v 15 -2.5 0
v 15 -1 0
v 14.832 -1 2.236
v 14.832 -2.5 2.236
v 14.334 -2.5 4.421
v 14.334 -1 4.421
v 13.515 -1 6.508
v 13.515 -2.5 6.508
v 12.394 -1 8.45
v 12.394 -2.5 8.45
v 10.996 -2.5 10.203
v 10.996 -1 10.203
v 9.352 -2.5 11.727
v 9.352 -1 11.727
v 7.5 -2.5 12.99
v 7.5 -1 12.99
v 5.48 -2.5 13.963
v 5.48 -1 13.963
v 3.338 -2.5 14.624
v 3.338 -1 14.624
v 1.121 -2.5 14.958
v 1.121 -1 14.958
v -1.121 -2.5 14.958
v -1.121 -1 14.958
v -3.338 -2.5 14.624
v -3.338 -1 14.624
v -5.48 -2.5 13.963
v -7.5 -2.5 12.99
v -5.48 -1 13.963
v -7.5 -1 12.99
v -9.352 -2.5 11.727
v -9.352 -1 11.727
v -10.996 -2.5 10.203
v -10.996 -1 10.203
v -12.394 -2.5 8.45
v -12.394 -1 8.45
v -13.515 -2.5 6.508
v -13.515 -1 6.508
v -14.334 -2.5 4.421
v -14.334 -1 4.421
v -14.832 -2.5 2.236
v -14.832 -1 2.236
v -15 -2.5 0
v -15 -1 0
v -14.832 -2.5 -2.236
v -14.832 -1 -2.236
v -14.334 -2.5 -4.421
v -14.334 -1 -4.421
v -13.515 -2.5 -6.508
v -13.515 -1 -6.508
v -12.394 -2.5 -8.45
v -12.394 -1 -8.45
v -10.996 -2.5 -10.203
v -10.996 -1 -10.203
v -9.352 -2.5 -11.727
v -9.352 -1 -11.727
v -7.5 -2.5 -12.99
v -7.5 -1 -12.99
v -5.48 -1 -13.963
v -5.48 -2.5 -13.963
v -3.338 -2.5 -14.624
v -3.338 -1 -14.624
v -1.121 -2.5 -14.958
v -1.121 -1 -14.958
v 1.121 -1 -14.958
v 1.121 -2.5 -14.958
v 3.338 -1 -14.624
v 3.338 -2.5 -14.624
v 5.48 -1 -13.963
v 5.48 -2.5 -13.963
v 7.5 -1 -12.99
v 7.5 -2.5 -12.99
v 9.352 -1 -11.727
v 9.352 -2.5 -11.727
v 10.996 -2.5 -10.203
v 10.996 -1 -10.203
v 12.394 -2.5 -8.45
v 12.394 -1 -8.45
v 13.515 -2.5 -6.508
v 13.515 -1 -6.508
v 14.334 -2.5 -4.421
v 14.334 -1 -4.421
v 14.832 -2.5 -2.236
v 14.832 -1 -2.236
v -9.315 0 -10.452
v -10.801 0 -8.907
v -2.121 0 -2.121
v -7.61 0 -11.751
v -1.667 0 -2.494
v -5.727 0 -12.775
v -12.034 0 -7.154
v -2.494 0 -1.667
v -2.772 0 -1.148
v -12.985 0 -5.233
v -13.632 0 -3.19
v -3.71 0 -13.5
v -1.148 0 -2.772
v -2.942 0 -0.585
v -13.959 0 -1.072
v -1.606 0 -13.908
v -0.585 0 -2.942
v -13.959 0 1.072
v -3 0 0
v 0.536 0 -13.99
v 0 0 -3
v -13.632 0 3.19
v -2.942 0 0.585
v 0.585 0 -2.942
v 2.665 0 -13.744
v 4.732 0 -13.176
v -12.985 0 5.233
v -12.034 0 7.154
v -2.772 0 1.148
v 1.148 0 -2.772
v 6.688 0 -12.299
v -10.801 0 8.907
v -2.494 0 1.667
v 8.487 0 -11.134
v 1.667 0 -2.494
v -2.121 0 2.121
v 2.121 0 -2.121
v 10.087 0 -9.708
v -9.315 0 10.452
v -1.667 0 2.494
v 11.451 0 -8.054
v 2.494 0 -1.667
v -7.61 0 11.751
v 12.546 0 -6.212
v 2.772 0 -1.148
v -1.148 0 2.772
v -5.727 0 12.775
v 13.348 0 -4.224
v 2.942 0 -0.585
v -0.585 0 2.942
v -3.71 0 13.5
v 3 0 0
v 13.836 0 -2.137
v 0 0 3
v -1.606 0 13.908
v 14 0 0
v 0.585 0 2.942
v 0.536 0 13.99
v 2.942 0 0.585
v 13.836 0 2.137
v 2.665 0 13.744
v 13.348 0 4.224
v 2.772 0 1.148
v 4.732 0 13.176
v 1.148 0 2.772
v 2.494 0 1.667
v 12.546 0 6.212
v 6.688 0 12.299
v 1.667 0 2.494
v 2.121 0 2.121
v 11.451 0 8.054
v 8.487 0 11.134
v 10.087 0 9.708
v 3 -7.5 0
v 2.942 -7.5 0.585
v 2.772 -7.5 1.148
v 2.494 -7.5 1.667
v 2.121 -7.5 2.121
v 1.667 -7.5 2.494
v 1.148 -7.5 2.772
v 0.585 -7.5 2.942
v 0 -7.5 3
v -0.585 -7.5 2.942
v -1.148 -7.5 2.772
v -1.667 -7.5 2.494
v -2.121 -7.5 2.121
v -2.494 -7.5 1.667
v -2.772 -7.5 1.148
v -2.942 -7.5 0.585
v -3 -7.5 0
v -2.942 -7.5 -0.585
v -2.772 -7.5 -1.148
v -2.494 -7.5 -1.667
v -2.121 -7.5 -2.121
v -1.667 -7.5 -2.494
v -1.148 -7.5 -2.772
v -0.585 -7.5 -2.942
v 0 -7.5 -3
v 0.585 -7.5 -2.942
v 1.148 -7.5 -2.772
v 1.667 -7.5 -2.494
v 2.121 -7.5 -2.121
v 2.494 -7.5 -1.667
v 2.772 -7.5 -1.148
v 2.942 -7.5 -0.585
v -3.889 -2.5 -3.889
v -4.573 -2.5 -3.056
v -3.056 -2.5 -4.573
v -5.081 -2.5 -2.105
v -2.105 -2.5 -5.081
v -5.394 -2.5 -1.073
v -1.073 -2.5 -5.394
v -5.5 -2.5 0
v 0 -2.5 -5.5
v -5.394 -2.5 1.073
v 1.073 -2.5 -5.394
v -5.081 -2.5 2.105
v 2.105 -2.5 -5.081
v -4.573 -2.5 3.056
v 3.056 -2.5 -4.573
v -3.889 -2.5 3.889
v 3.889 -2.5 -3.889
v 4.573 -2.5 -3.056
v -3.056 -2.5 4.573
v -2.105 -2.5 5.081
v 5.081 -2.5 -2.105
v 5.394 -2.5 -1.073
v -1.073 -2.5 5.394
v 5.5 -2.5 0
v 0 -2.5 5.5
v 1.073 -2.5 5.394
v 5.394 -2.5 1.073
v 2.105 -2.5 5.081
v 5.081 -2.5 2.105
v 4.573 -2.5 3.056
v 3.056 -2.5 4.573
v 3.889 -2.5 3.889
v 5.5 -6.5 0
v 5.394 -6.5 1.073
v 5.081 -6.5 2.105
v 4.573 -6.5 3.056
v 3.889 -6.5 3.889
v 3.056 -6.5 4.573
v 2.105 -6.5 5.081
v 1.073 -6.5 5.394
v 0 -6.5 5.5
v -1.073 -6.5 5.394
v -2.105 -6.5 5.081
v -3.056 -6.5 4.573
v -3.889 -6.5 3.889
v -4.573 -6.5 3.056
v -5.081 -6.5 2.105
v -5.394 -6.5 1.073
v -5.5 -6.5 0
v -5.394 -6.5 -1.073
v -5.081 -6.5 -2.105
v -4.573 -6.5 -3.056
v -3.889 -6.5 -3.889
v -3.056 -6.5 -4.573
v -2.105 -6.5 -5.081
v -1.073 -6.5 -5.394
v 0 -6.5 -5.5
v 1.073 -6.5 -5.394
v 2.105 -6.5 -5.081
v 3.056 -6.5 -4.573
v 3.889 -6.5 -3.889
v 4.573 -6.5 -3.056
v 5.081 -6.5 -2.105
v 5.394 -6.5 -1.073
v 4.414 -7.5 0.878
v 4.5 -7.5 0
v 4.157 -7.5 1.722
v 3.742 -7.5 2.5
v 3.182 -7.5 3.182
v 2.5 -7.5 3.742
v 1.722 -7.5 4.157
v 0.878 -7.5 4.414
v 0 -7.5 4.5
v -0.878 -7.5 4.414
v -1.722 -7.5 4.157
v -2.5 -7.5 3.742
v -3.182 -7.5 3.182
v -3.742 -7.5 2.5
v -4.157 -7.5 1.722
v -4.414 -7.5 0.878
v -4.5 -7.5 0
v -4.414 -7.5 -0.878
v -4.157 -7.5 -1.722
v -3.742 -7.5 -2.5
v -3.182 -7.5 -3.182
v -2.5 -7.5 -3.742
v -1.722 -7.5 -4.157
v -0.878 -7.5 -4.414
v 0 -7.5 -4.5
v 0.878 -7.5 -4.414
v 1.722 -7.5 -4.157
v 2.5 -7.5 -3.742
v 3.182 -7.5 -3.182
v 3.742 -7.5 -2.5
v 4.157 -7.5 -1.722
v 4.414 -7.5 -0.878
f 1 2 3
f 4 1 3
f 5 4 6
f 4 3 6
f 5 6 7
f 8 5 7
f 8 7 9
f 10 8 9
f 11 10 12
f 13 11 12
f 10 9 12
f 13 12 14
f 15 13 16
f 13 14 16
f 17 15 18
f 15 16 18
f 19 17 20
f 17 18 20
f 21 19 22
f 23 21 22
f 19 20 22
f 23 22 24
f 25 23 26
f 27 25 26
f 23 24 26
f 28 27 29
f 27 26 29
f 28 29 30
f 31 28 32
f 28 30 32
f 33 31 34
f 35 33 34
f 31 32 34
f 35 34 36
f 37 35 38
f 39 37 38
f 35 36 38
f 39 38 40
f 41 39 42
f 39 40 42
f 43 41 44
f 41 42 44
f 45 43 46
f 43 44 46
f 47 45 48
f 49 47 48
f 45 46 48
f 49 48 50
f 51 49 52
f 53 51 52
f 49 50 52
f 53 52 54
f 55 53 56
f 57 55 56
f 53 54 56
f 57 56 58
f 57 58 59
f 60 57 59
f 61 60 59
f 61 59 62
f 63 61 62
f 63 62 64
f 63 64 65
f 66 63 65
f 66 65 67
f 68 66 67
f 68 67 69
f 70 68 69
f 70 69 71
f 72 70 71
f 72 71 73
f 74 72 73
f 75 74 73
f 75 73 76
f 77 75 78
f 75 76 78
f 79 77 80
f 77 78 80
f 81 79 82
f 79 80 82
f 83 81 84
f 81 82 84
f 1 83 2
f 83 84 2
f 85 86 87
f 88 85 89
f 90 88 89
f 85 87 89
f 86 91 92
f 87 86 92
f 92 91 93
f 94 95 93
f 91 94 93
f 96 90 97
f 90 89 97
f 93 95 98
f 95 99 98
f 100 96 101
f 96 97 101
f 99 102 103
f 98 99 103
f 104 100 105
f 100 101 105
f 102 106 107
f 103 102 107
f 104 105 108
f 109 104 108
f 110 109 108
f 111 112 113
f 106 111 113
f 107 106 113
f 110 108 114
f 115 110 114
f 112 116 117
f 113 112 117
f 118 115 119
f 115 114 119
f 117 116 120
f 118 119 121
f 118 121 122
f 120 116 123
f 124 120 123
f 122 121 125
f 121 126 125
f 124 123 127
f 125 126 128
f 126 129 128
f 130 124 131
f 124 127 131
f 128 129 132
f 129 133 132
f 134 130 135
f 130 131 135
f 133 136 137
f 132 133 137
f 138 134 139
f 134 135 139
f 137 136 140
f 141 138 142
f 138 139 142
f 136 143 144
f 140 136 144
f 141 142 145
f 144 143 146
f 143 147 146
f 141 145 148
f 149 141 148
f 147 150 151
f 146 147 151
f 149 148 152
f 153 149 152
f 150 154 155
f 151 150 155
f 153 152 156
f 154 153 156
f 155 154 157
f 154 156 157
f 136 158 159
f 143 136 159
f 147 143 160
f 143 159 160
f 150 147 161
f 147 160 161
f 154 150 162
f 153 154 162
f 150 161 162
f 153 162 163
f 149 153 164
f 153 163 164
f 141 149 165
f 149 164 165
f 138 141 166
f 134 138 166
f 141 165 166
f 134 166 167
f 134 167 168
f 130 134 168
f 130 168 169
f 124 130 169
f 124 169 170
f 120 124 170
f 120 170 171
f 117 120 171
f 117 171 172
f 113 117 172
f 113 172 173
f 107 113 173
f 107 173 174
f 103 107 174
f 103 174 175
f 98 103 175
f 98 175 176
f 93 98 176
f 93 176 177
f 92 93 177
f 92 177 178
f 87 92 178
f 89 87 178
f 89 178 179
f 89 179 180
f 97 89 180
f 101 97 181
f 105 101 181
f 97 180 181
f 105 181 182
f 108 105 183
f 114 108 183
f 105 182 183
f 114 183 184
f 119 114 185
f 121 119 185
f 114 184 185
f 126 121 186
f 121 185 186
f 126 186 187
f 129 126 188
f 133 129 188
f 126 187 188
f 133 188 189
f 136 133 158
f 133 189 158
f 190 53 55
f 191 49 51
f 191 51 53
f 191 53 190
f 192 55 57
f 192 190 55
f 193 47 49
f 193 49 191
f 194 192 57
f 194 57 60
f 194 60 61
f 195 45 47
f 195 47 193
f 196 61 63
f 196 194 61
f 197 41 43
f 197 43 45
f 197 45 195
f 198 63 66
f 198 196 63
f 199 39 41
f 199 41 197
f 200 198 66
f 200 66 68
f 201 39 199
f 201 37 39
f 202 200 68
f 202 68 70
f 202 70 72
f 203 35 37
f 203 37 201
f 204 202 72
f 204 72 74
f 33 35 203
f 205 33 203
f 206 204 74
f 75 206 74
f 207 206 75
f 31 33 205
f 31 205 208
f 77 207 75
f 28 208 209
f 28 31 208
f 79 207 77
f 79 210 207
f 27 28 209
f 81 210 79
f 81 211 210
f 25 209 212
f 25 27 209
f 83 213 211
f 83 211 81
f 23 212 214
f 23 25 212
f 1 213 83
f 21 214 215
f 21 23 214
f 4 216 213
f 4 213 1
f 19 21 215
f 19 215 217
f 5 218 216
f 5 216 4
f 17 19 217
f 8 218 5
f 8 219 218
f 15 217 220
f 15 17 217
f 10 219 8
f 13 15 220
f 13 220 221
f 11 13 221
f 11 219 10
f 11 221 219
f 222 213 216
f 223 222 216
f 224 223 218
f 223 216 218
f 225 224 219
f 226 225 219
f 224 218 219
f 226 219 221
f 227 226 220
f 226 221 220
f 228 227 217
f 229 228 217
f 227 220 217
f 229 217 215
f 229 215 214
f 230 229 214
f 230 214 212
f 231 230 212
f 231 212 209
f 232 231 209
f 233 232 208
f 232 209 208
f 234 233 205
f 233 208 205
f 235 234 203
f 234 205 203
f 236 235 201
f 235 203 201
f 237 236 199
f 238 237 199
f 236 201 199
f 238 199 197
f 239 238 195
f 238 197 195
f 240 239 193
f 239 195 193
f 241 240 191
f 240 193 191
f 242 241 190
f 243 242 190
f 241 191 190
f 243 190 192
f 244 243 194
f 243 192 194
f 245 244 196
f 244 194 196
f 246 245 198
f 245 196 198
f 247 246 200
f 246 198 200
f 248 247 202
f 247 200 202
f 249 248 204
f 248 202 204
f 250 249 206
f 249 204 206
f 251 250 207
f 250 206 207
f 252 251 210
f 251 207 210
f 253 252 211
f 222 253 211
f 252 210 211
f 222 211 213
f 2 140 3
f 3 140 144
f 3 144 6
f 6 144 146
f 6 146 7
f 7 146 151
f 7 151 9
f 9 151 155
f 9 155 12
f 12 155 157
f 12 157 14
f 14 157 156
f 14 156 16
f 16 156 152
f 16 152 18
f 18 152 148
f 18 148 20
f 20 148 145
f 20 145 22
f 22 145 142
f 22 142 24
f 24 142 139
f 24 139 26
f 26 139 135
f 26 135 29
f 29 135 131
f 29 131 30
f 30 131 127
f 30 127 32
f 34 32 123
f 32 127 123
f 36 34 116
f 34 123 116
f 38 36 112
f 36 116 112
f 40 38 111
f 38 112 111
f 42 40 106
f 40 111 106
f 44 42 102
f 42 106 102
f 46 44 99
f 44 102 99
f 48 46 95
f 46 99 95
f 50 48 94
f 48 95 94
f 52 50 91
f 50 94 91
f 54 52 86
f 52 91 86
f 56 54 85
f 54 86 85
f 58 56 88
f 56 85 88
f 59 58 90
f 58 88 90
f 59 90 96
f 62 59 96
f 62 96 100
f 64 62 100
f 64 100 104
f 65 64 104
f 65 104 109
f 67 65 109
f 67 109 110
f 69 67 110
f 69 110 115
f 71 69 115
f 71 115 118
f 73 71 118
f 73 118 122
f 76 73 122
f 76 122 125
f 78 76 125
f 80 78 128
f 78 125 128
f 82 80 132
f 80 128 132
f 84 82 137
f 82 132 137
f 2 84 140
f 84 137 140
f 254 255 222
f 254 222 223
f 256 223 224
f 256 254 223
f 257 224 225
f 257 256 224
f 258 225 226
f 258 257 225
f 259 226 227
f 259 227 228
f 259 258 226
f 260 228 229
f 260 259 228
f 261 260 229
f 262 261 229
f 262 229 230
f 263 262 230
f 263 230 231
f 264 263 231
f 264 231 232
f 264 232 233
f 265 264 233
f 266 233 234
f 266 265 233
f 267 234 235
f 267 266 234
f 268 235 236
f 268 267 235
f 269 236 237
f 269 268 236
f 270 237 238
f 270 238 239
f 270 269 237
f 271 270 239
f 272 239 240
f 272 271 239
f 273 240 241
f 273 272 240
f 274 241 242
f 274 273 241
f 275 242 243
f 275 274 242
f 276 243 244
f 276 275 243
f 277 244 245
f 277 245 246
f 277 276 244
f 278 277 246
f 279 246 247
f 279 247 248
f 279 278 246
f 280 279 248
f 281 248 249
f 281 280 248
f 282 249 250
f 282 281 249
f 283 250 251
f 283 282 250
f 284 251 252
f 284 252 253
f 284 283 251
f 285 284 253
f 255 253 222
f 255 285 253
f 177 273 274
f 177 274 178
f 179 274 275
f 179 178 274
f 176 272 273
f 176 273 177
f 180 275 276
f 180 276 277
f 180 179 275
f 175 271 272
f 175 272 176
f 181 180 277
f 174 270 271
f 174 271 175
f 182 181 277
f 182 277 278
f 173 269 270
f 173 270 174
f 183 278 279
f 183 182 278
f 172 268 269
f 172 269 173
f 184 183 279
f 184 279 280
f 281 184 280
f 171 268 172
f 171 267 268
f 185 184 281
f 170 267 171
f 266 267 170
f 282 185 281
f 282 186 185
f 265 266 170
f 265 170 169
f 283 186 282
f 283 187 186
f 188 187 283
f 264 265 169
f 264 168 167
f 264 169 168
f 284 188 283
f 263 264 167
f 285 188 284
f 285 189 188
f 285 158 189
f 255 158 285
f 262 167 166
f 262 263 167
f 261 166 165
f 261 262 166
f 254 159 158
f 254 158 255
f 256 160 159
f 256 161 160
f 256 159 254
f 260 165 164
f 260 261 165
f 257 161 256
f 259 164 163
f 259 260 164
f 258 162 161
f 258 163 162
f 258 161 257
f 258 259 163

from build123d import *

# Parameters (mm, degrees)
F0_R     = 15
F1_DEPTH = 2.5
F2_R     = 5.5
F3_DEPTH = 5
F4_R     = 3
F5_DEPTH = 25
F6_SIZE  = 1


with BuildPart() as f1:
    # F0 (on Front) → F1 (new body)
    with BuildSketch(Plane.XZ):
        Circle(F0_R)
    extrude(amount=F1_DEPTH)

    # F2 (on face) → F3 (join)
    with BuildSketch(Plane.XZ.offset(2.5)):
        Circle(F2_R)
    extrude(amount=F3_DEPTH)

    # F4 (on face) → F5 (cut)
    with BuildSketch(Plane.XZ.offset(7.5)):
        Circle(F4_R)
    extrude(amount=-F5_DEPTH, mode=Mode.SUBTRACT)

    # F6
    f6_edges = [f1.edges().sort_by_distance(p)[0] for p in [
        (-5.5, -7.5, 0),
        (-15, 0, 0),
    ]]
    chamfer(f6_edges, length=F6_SIZE)


solid = f1.part
